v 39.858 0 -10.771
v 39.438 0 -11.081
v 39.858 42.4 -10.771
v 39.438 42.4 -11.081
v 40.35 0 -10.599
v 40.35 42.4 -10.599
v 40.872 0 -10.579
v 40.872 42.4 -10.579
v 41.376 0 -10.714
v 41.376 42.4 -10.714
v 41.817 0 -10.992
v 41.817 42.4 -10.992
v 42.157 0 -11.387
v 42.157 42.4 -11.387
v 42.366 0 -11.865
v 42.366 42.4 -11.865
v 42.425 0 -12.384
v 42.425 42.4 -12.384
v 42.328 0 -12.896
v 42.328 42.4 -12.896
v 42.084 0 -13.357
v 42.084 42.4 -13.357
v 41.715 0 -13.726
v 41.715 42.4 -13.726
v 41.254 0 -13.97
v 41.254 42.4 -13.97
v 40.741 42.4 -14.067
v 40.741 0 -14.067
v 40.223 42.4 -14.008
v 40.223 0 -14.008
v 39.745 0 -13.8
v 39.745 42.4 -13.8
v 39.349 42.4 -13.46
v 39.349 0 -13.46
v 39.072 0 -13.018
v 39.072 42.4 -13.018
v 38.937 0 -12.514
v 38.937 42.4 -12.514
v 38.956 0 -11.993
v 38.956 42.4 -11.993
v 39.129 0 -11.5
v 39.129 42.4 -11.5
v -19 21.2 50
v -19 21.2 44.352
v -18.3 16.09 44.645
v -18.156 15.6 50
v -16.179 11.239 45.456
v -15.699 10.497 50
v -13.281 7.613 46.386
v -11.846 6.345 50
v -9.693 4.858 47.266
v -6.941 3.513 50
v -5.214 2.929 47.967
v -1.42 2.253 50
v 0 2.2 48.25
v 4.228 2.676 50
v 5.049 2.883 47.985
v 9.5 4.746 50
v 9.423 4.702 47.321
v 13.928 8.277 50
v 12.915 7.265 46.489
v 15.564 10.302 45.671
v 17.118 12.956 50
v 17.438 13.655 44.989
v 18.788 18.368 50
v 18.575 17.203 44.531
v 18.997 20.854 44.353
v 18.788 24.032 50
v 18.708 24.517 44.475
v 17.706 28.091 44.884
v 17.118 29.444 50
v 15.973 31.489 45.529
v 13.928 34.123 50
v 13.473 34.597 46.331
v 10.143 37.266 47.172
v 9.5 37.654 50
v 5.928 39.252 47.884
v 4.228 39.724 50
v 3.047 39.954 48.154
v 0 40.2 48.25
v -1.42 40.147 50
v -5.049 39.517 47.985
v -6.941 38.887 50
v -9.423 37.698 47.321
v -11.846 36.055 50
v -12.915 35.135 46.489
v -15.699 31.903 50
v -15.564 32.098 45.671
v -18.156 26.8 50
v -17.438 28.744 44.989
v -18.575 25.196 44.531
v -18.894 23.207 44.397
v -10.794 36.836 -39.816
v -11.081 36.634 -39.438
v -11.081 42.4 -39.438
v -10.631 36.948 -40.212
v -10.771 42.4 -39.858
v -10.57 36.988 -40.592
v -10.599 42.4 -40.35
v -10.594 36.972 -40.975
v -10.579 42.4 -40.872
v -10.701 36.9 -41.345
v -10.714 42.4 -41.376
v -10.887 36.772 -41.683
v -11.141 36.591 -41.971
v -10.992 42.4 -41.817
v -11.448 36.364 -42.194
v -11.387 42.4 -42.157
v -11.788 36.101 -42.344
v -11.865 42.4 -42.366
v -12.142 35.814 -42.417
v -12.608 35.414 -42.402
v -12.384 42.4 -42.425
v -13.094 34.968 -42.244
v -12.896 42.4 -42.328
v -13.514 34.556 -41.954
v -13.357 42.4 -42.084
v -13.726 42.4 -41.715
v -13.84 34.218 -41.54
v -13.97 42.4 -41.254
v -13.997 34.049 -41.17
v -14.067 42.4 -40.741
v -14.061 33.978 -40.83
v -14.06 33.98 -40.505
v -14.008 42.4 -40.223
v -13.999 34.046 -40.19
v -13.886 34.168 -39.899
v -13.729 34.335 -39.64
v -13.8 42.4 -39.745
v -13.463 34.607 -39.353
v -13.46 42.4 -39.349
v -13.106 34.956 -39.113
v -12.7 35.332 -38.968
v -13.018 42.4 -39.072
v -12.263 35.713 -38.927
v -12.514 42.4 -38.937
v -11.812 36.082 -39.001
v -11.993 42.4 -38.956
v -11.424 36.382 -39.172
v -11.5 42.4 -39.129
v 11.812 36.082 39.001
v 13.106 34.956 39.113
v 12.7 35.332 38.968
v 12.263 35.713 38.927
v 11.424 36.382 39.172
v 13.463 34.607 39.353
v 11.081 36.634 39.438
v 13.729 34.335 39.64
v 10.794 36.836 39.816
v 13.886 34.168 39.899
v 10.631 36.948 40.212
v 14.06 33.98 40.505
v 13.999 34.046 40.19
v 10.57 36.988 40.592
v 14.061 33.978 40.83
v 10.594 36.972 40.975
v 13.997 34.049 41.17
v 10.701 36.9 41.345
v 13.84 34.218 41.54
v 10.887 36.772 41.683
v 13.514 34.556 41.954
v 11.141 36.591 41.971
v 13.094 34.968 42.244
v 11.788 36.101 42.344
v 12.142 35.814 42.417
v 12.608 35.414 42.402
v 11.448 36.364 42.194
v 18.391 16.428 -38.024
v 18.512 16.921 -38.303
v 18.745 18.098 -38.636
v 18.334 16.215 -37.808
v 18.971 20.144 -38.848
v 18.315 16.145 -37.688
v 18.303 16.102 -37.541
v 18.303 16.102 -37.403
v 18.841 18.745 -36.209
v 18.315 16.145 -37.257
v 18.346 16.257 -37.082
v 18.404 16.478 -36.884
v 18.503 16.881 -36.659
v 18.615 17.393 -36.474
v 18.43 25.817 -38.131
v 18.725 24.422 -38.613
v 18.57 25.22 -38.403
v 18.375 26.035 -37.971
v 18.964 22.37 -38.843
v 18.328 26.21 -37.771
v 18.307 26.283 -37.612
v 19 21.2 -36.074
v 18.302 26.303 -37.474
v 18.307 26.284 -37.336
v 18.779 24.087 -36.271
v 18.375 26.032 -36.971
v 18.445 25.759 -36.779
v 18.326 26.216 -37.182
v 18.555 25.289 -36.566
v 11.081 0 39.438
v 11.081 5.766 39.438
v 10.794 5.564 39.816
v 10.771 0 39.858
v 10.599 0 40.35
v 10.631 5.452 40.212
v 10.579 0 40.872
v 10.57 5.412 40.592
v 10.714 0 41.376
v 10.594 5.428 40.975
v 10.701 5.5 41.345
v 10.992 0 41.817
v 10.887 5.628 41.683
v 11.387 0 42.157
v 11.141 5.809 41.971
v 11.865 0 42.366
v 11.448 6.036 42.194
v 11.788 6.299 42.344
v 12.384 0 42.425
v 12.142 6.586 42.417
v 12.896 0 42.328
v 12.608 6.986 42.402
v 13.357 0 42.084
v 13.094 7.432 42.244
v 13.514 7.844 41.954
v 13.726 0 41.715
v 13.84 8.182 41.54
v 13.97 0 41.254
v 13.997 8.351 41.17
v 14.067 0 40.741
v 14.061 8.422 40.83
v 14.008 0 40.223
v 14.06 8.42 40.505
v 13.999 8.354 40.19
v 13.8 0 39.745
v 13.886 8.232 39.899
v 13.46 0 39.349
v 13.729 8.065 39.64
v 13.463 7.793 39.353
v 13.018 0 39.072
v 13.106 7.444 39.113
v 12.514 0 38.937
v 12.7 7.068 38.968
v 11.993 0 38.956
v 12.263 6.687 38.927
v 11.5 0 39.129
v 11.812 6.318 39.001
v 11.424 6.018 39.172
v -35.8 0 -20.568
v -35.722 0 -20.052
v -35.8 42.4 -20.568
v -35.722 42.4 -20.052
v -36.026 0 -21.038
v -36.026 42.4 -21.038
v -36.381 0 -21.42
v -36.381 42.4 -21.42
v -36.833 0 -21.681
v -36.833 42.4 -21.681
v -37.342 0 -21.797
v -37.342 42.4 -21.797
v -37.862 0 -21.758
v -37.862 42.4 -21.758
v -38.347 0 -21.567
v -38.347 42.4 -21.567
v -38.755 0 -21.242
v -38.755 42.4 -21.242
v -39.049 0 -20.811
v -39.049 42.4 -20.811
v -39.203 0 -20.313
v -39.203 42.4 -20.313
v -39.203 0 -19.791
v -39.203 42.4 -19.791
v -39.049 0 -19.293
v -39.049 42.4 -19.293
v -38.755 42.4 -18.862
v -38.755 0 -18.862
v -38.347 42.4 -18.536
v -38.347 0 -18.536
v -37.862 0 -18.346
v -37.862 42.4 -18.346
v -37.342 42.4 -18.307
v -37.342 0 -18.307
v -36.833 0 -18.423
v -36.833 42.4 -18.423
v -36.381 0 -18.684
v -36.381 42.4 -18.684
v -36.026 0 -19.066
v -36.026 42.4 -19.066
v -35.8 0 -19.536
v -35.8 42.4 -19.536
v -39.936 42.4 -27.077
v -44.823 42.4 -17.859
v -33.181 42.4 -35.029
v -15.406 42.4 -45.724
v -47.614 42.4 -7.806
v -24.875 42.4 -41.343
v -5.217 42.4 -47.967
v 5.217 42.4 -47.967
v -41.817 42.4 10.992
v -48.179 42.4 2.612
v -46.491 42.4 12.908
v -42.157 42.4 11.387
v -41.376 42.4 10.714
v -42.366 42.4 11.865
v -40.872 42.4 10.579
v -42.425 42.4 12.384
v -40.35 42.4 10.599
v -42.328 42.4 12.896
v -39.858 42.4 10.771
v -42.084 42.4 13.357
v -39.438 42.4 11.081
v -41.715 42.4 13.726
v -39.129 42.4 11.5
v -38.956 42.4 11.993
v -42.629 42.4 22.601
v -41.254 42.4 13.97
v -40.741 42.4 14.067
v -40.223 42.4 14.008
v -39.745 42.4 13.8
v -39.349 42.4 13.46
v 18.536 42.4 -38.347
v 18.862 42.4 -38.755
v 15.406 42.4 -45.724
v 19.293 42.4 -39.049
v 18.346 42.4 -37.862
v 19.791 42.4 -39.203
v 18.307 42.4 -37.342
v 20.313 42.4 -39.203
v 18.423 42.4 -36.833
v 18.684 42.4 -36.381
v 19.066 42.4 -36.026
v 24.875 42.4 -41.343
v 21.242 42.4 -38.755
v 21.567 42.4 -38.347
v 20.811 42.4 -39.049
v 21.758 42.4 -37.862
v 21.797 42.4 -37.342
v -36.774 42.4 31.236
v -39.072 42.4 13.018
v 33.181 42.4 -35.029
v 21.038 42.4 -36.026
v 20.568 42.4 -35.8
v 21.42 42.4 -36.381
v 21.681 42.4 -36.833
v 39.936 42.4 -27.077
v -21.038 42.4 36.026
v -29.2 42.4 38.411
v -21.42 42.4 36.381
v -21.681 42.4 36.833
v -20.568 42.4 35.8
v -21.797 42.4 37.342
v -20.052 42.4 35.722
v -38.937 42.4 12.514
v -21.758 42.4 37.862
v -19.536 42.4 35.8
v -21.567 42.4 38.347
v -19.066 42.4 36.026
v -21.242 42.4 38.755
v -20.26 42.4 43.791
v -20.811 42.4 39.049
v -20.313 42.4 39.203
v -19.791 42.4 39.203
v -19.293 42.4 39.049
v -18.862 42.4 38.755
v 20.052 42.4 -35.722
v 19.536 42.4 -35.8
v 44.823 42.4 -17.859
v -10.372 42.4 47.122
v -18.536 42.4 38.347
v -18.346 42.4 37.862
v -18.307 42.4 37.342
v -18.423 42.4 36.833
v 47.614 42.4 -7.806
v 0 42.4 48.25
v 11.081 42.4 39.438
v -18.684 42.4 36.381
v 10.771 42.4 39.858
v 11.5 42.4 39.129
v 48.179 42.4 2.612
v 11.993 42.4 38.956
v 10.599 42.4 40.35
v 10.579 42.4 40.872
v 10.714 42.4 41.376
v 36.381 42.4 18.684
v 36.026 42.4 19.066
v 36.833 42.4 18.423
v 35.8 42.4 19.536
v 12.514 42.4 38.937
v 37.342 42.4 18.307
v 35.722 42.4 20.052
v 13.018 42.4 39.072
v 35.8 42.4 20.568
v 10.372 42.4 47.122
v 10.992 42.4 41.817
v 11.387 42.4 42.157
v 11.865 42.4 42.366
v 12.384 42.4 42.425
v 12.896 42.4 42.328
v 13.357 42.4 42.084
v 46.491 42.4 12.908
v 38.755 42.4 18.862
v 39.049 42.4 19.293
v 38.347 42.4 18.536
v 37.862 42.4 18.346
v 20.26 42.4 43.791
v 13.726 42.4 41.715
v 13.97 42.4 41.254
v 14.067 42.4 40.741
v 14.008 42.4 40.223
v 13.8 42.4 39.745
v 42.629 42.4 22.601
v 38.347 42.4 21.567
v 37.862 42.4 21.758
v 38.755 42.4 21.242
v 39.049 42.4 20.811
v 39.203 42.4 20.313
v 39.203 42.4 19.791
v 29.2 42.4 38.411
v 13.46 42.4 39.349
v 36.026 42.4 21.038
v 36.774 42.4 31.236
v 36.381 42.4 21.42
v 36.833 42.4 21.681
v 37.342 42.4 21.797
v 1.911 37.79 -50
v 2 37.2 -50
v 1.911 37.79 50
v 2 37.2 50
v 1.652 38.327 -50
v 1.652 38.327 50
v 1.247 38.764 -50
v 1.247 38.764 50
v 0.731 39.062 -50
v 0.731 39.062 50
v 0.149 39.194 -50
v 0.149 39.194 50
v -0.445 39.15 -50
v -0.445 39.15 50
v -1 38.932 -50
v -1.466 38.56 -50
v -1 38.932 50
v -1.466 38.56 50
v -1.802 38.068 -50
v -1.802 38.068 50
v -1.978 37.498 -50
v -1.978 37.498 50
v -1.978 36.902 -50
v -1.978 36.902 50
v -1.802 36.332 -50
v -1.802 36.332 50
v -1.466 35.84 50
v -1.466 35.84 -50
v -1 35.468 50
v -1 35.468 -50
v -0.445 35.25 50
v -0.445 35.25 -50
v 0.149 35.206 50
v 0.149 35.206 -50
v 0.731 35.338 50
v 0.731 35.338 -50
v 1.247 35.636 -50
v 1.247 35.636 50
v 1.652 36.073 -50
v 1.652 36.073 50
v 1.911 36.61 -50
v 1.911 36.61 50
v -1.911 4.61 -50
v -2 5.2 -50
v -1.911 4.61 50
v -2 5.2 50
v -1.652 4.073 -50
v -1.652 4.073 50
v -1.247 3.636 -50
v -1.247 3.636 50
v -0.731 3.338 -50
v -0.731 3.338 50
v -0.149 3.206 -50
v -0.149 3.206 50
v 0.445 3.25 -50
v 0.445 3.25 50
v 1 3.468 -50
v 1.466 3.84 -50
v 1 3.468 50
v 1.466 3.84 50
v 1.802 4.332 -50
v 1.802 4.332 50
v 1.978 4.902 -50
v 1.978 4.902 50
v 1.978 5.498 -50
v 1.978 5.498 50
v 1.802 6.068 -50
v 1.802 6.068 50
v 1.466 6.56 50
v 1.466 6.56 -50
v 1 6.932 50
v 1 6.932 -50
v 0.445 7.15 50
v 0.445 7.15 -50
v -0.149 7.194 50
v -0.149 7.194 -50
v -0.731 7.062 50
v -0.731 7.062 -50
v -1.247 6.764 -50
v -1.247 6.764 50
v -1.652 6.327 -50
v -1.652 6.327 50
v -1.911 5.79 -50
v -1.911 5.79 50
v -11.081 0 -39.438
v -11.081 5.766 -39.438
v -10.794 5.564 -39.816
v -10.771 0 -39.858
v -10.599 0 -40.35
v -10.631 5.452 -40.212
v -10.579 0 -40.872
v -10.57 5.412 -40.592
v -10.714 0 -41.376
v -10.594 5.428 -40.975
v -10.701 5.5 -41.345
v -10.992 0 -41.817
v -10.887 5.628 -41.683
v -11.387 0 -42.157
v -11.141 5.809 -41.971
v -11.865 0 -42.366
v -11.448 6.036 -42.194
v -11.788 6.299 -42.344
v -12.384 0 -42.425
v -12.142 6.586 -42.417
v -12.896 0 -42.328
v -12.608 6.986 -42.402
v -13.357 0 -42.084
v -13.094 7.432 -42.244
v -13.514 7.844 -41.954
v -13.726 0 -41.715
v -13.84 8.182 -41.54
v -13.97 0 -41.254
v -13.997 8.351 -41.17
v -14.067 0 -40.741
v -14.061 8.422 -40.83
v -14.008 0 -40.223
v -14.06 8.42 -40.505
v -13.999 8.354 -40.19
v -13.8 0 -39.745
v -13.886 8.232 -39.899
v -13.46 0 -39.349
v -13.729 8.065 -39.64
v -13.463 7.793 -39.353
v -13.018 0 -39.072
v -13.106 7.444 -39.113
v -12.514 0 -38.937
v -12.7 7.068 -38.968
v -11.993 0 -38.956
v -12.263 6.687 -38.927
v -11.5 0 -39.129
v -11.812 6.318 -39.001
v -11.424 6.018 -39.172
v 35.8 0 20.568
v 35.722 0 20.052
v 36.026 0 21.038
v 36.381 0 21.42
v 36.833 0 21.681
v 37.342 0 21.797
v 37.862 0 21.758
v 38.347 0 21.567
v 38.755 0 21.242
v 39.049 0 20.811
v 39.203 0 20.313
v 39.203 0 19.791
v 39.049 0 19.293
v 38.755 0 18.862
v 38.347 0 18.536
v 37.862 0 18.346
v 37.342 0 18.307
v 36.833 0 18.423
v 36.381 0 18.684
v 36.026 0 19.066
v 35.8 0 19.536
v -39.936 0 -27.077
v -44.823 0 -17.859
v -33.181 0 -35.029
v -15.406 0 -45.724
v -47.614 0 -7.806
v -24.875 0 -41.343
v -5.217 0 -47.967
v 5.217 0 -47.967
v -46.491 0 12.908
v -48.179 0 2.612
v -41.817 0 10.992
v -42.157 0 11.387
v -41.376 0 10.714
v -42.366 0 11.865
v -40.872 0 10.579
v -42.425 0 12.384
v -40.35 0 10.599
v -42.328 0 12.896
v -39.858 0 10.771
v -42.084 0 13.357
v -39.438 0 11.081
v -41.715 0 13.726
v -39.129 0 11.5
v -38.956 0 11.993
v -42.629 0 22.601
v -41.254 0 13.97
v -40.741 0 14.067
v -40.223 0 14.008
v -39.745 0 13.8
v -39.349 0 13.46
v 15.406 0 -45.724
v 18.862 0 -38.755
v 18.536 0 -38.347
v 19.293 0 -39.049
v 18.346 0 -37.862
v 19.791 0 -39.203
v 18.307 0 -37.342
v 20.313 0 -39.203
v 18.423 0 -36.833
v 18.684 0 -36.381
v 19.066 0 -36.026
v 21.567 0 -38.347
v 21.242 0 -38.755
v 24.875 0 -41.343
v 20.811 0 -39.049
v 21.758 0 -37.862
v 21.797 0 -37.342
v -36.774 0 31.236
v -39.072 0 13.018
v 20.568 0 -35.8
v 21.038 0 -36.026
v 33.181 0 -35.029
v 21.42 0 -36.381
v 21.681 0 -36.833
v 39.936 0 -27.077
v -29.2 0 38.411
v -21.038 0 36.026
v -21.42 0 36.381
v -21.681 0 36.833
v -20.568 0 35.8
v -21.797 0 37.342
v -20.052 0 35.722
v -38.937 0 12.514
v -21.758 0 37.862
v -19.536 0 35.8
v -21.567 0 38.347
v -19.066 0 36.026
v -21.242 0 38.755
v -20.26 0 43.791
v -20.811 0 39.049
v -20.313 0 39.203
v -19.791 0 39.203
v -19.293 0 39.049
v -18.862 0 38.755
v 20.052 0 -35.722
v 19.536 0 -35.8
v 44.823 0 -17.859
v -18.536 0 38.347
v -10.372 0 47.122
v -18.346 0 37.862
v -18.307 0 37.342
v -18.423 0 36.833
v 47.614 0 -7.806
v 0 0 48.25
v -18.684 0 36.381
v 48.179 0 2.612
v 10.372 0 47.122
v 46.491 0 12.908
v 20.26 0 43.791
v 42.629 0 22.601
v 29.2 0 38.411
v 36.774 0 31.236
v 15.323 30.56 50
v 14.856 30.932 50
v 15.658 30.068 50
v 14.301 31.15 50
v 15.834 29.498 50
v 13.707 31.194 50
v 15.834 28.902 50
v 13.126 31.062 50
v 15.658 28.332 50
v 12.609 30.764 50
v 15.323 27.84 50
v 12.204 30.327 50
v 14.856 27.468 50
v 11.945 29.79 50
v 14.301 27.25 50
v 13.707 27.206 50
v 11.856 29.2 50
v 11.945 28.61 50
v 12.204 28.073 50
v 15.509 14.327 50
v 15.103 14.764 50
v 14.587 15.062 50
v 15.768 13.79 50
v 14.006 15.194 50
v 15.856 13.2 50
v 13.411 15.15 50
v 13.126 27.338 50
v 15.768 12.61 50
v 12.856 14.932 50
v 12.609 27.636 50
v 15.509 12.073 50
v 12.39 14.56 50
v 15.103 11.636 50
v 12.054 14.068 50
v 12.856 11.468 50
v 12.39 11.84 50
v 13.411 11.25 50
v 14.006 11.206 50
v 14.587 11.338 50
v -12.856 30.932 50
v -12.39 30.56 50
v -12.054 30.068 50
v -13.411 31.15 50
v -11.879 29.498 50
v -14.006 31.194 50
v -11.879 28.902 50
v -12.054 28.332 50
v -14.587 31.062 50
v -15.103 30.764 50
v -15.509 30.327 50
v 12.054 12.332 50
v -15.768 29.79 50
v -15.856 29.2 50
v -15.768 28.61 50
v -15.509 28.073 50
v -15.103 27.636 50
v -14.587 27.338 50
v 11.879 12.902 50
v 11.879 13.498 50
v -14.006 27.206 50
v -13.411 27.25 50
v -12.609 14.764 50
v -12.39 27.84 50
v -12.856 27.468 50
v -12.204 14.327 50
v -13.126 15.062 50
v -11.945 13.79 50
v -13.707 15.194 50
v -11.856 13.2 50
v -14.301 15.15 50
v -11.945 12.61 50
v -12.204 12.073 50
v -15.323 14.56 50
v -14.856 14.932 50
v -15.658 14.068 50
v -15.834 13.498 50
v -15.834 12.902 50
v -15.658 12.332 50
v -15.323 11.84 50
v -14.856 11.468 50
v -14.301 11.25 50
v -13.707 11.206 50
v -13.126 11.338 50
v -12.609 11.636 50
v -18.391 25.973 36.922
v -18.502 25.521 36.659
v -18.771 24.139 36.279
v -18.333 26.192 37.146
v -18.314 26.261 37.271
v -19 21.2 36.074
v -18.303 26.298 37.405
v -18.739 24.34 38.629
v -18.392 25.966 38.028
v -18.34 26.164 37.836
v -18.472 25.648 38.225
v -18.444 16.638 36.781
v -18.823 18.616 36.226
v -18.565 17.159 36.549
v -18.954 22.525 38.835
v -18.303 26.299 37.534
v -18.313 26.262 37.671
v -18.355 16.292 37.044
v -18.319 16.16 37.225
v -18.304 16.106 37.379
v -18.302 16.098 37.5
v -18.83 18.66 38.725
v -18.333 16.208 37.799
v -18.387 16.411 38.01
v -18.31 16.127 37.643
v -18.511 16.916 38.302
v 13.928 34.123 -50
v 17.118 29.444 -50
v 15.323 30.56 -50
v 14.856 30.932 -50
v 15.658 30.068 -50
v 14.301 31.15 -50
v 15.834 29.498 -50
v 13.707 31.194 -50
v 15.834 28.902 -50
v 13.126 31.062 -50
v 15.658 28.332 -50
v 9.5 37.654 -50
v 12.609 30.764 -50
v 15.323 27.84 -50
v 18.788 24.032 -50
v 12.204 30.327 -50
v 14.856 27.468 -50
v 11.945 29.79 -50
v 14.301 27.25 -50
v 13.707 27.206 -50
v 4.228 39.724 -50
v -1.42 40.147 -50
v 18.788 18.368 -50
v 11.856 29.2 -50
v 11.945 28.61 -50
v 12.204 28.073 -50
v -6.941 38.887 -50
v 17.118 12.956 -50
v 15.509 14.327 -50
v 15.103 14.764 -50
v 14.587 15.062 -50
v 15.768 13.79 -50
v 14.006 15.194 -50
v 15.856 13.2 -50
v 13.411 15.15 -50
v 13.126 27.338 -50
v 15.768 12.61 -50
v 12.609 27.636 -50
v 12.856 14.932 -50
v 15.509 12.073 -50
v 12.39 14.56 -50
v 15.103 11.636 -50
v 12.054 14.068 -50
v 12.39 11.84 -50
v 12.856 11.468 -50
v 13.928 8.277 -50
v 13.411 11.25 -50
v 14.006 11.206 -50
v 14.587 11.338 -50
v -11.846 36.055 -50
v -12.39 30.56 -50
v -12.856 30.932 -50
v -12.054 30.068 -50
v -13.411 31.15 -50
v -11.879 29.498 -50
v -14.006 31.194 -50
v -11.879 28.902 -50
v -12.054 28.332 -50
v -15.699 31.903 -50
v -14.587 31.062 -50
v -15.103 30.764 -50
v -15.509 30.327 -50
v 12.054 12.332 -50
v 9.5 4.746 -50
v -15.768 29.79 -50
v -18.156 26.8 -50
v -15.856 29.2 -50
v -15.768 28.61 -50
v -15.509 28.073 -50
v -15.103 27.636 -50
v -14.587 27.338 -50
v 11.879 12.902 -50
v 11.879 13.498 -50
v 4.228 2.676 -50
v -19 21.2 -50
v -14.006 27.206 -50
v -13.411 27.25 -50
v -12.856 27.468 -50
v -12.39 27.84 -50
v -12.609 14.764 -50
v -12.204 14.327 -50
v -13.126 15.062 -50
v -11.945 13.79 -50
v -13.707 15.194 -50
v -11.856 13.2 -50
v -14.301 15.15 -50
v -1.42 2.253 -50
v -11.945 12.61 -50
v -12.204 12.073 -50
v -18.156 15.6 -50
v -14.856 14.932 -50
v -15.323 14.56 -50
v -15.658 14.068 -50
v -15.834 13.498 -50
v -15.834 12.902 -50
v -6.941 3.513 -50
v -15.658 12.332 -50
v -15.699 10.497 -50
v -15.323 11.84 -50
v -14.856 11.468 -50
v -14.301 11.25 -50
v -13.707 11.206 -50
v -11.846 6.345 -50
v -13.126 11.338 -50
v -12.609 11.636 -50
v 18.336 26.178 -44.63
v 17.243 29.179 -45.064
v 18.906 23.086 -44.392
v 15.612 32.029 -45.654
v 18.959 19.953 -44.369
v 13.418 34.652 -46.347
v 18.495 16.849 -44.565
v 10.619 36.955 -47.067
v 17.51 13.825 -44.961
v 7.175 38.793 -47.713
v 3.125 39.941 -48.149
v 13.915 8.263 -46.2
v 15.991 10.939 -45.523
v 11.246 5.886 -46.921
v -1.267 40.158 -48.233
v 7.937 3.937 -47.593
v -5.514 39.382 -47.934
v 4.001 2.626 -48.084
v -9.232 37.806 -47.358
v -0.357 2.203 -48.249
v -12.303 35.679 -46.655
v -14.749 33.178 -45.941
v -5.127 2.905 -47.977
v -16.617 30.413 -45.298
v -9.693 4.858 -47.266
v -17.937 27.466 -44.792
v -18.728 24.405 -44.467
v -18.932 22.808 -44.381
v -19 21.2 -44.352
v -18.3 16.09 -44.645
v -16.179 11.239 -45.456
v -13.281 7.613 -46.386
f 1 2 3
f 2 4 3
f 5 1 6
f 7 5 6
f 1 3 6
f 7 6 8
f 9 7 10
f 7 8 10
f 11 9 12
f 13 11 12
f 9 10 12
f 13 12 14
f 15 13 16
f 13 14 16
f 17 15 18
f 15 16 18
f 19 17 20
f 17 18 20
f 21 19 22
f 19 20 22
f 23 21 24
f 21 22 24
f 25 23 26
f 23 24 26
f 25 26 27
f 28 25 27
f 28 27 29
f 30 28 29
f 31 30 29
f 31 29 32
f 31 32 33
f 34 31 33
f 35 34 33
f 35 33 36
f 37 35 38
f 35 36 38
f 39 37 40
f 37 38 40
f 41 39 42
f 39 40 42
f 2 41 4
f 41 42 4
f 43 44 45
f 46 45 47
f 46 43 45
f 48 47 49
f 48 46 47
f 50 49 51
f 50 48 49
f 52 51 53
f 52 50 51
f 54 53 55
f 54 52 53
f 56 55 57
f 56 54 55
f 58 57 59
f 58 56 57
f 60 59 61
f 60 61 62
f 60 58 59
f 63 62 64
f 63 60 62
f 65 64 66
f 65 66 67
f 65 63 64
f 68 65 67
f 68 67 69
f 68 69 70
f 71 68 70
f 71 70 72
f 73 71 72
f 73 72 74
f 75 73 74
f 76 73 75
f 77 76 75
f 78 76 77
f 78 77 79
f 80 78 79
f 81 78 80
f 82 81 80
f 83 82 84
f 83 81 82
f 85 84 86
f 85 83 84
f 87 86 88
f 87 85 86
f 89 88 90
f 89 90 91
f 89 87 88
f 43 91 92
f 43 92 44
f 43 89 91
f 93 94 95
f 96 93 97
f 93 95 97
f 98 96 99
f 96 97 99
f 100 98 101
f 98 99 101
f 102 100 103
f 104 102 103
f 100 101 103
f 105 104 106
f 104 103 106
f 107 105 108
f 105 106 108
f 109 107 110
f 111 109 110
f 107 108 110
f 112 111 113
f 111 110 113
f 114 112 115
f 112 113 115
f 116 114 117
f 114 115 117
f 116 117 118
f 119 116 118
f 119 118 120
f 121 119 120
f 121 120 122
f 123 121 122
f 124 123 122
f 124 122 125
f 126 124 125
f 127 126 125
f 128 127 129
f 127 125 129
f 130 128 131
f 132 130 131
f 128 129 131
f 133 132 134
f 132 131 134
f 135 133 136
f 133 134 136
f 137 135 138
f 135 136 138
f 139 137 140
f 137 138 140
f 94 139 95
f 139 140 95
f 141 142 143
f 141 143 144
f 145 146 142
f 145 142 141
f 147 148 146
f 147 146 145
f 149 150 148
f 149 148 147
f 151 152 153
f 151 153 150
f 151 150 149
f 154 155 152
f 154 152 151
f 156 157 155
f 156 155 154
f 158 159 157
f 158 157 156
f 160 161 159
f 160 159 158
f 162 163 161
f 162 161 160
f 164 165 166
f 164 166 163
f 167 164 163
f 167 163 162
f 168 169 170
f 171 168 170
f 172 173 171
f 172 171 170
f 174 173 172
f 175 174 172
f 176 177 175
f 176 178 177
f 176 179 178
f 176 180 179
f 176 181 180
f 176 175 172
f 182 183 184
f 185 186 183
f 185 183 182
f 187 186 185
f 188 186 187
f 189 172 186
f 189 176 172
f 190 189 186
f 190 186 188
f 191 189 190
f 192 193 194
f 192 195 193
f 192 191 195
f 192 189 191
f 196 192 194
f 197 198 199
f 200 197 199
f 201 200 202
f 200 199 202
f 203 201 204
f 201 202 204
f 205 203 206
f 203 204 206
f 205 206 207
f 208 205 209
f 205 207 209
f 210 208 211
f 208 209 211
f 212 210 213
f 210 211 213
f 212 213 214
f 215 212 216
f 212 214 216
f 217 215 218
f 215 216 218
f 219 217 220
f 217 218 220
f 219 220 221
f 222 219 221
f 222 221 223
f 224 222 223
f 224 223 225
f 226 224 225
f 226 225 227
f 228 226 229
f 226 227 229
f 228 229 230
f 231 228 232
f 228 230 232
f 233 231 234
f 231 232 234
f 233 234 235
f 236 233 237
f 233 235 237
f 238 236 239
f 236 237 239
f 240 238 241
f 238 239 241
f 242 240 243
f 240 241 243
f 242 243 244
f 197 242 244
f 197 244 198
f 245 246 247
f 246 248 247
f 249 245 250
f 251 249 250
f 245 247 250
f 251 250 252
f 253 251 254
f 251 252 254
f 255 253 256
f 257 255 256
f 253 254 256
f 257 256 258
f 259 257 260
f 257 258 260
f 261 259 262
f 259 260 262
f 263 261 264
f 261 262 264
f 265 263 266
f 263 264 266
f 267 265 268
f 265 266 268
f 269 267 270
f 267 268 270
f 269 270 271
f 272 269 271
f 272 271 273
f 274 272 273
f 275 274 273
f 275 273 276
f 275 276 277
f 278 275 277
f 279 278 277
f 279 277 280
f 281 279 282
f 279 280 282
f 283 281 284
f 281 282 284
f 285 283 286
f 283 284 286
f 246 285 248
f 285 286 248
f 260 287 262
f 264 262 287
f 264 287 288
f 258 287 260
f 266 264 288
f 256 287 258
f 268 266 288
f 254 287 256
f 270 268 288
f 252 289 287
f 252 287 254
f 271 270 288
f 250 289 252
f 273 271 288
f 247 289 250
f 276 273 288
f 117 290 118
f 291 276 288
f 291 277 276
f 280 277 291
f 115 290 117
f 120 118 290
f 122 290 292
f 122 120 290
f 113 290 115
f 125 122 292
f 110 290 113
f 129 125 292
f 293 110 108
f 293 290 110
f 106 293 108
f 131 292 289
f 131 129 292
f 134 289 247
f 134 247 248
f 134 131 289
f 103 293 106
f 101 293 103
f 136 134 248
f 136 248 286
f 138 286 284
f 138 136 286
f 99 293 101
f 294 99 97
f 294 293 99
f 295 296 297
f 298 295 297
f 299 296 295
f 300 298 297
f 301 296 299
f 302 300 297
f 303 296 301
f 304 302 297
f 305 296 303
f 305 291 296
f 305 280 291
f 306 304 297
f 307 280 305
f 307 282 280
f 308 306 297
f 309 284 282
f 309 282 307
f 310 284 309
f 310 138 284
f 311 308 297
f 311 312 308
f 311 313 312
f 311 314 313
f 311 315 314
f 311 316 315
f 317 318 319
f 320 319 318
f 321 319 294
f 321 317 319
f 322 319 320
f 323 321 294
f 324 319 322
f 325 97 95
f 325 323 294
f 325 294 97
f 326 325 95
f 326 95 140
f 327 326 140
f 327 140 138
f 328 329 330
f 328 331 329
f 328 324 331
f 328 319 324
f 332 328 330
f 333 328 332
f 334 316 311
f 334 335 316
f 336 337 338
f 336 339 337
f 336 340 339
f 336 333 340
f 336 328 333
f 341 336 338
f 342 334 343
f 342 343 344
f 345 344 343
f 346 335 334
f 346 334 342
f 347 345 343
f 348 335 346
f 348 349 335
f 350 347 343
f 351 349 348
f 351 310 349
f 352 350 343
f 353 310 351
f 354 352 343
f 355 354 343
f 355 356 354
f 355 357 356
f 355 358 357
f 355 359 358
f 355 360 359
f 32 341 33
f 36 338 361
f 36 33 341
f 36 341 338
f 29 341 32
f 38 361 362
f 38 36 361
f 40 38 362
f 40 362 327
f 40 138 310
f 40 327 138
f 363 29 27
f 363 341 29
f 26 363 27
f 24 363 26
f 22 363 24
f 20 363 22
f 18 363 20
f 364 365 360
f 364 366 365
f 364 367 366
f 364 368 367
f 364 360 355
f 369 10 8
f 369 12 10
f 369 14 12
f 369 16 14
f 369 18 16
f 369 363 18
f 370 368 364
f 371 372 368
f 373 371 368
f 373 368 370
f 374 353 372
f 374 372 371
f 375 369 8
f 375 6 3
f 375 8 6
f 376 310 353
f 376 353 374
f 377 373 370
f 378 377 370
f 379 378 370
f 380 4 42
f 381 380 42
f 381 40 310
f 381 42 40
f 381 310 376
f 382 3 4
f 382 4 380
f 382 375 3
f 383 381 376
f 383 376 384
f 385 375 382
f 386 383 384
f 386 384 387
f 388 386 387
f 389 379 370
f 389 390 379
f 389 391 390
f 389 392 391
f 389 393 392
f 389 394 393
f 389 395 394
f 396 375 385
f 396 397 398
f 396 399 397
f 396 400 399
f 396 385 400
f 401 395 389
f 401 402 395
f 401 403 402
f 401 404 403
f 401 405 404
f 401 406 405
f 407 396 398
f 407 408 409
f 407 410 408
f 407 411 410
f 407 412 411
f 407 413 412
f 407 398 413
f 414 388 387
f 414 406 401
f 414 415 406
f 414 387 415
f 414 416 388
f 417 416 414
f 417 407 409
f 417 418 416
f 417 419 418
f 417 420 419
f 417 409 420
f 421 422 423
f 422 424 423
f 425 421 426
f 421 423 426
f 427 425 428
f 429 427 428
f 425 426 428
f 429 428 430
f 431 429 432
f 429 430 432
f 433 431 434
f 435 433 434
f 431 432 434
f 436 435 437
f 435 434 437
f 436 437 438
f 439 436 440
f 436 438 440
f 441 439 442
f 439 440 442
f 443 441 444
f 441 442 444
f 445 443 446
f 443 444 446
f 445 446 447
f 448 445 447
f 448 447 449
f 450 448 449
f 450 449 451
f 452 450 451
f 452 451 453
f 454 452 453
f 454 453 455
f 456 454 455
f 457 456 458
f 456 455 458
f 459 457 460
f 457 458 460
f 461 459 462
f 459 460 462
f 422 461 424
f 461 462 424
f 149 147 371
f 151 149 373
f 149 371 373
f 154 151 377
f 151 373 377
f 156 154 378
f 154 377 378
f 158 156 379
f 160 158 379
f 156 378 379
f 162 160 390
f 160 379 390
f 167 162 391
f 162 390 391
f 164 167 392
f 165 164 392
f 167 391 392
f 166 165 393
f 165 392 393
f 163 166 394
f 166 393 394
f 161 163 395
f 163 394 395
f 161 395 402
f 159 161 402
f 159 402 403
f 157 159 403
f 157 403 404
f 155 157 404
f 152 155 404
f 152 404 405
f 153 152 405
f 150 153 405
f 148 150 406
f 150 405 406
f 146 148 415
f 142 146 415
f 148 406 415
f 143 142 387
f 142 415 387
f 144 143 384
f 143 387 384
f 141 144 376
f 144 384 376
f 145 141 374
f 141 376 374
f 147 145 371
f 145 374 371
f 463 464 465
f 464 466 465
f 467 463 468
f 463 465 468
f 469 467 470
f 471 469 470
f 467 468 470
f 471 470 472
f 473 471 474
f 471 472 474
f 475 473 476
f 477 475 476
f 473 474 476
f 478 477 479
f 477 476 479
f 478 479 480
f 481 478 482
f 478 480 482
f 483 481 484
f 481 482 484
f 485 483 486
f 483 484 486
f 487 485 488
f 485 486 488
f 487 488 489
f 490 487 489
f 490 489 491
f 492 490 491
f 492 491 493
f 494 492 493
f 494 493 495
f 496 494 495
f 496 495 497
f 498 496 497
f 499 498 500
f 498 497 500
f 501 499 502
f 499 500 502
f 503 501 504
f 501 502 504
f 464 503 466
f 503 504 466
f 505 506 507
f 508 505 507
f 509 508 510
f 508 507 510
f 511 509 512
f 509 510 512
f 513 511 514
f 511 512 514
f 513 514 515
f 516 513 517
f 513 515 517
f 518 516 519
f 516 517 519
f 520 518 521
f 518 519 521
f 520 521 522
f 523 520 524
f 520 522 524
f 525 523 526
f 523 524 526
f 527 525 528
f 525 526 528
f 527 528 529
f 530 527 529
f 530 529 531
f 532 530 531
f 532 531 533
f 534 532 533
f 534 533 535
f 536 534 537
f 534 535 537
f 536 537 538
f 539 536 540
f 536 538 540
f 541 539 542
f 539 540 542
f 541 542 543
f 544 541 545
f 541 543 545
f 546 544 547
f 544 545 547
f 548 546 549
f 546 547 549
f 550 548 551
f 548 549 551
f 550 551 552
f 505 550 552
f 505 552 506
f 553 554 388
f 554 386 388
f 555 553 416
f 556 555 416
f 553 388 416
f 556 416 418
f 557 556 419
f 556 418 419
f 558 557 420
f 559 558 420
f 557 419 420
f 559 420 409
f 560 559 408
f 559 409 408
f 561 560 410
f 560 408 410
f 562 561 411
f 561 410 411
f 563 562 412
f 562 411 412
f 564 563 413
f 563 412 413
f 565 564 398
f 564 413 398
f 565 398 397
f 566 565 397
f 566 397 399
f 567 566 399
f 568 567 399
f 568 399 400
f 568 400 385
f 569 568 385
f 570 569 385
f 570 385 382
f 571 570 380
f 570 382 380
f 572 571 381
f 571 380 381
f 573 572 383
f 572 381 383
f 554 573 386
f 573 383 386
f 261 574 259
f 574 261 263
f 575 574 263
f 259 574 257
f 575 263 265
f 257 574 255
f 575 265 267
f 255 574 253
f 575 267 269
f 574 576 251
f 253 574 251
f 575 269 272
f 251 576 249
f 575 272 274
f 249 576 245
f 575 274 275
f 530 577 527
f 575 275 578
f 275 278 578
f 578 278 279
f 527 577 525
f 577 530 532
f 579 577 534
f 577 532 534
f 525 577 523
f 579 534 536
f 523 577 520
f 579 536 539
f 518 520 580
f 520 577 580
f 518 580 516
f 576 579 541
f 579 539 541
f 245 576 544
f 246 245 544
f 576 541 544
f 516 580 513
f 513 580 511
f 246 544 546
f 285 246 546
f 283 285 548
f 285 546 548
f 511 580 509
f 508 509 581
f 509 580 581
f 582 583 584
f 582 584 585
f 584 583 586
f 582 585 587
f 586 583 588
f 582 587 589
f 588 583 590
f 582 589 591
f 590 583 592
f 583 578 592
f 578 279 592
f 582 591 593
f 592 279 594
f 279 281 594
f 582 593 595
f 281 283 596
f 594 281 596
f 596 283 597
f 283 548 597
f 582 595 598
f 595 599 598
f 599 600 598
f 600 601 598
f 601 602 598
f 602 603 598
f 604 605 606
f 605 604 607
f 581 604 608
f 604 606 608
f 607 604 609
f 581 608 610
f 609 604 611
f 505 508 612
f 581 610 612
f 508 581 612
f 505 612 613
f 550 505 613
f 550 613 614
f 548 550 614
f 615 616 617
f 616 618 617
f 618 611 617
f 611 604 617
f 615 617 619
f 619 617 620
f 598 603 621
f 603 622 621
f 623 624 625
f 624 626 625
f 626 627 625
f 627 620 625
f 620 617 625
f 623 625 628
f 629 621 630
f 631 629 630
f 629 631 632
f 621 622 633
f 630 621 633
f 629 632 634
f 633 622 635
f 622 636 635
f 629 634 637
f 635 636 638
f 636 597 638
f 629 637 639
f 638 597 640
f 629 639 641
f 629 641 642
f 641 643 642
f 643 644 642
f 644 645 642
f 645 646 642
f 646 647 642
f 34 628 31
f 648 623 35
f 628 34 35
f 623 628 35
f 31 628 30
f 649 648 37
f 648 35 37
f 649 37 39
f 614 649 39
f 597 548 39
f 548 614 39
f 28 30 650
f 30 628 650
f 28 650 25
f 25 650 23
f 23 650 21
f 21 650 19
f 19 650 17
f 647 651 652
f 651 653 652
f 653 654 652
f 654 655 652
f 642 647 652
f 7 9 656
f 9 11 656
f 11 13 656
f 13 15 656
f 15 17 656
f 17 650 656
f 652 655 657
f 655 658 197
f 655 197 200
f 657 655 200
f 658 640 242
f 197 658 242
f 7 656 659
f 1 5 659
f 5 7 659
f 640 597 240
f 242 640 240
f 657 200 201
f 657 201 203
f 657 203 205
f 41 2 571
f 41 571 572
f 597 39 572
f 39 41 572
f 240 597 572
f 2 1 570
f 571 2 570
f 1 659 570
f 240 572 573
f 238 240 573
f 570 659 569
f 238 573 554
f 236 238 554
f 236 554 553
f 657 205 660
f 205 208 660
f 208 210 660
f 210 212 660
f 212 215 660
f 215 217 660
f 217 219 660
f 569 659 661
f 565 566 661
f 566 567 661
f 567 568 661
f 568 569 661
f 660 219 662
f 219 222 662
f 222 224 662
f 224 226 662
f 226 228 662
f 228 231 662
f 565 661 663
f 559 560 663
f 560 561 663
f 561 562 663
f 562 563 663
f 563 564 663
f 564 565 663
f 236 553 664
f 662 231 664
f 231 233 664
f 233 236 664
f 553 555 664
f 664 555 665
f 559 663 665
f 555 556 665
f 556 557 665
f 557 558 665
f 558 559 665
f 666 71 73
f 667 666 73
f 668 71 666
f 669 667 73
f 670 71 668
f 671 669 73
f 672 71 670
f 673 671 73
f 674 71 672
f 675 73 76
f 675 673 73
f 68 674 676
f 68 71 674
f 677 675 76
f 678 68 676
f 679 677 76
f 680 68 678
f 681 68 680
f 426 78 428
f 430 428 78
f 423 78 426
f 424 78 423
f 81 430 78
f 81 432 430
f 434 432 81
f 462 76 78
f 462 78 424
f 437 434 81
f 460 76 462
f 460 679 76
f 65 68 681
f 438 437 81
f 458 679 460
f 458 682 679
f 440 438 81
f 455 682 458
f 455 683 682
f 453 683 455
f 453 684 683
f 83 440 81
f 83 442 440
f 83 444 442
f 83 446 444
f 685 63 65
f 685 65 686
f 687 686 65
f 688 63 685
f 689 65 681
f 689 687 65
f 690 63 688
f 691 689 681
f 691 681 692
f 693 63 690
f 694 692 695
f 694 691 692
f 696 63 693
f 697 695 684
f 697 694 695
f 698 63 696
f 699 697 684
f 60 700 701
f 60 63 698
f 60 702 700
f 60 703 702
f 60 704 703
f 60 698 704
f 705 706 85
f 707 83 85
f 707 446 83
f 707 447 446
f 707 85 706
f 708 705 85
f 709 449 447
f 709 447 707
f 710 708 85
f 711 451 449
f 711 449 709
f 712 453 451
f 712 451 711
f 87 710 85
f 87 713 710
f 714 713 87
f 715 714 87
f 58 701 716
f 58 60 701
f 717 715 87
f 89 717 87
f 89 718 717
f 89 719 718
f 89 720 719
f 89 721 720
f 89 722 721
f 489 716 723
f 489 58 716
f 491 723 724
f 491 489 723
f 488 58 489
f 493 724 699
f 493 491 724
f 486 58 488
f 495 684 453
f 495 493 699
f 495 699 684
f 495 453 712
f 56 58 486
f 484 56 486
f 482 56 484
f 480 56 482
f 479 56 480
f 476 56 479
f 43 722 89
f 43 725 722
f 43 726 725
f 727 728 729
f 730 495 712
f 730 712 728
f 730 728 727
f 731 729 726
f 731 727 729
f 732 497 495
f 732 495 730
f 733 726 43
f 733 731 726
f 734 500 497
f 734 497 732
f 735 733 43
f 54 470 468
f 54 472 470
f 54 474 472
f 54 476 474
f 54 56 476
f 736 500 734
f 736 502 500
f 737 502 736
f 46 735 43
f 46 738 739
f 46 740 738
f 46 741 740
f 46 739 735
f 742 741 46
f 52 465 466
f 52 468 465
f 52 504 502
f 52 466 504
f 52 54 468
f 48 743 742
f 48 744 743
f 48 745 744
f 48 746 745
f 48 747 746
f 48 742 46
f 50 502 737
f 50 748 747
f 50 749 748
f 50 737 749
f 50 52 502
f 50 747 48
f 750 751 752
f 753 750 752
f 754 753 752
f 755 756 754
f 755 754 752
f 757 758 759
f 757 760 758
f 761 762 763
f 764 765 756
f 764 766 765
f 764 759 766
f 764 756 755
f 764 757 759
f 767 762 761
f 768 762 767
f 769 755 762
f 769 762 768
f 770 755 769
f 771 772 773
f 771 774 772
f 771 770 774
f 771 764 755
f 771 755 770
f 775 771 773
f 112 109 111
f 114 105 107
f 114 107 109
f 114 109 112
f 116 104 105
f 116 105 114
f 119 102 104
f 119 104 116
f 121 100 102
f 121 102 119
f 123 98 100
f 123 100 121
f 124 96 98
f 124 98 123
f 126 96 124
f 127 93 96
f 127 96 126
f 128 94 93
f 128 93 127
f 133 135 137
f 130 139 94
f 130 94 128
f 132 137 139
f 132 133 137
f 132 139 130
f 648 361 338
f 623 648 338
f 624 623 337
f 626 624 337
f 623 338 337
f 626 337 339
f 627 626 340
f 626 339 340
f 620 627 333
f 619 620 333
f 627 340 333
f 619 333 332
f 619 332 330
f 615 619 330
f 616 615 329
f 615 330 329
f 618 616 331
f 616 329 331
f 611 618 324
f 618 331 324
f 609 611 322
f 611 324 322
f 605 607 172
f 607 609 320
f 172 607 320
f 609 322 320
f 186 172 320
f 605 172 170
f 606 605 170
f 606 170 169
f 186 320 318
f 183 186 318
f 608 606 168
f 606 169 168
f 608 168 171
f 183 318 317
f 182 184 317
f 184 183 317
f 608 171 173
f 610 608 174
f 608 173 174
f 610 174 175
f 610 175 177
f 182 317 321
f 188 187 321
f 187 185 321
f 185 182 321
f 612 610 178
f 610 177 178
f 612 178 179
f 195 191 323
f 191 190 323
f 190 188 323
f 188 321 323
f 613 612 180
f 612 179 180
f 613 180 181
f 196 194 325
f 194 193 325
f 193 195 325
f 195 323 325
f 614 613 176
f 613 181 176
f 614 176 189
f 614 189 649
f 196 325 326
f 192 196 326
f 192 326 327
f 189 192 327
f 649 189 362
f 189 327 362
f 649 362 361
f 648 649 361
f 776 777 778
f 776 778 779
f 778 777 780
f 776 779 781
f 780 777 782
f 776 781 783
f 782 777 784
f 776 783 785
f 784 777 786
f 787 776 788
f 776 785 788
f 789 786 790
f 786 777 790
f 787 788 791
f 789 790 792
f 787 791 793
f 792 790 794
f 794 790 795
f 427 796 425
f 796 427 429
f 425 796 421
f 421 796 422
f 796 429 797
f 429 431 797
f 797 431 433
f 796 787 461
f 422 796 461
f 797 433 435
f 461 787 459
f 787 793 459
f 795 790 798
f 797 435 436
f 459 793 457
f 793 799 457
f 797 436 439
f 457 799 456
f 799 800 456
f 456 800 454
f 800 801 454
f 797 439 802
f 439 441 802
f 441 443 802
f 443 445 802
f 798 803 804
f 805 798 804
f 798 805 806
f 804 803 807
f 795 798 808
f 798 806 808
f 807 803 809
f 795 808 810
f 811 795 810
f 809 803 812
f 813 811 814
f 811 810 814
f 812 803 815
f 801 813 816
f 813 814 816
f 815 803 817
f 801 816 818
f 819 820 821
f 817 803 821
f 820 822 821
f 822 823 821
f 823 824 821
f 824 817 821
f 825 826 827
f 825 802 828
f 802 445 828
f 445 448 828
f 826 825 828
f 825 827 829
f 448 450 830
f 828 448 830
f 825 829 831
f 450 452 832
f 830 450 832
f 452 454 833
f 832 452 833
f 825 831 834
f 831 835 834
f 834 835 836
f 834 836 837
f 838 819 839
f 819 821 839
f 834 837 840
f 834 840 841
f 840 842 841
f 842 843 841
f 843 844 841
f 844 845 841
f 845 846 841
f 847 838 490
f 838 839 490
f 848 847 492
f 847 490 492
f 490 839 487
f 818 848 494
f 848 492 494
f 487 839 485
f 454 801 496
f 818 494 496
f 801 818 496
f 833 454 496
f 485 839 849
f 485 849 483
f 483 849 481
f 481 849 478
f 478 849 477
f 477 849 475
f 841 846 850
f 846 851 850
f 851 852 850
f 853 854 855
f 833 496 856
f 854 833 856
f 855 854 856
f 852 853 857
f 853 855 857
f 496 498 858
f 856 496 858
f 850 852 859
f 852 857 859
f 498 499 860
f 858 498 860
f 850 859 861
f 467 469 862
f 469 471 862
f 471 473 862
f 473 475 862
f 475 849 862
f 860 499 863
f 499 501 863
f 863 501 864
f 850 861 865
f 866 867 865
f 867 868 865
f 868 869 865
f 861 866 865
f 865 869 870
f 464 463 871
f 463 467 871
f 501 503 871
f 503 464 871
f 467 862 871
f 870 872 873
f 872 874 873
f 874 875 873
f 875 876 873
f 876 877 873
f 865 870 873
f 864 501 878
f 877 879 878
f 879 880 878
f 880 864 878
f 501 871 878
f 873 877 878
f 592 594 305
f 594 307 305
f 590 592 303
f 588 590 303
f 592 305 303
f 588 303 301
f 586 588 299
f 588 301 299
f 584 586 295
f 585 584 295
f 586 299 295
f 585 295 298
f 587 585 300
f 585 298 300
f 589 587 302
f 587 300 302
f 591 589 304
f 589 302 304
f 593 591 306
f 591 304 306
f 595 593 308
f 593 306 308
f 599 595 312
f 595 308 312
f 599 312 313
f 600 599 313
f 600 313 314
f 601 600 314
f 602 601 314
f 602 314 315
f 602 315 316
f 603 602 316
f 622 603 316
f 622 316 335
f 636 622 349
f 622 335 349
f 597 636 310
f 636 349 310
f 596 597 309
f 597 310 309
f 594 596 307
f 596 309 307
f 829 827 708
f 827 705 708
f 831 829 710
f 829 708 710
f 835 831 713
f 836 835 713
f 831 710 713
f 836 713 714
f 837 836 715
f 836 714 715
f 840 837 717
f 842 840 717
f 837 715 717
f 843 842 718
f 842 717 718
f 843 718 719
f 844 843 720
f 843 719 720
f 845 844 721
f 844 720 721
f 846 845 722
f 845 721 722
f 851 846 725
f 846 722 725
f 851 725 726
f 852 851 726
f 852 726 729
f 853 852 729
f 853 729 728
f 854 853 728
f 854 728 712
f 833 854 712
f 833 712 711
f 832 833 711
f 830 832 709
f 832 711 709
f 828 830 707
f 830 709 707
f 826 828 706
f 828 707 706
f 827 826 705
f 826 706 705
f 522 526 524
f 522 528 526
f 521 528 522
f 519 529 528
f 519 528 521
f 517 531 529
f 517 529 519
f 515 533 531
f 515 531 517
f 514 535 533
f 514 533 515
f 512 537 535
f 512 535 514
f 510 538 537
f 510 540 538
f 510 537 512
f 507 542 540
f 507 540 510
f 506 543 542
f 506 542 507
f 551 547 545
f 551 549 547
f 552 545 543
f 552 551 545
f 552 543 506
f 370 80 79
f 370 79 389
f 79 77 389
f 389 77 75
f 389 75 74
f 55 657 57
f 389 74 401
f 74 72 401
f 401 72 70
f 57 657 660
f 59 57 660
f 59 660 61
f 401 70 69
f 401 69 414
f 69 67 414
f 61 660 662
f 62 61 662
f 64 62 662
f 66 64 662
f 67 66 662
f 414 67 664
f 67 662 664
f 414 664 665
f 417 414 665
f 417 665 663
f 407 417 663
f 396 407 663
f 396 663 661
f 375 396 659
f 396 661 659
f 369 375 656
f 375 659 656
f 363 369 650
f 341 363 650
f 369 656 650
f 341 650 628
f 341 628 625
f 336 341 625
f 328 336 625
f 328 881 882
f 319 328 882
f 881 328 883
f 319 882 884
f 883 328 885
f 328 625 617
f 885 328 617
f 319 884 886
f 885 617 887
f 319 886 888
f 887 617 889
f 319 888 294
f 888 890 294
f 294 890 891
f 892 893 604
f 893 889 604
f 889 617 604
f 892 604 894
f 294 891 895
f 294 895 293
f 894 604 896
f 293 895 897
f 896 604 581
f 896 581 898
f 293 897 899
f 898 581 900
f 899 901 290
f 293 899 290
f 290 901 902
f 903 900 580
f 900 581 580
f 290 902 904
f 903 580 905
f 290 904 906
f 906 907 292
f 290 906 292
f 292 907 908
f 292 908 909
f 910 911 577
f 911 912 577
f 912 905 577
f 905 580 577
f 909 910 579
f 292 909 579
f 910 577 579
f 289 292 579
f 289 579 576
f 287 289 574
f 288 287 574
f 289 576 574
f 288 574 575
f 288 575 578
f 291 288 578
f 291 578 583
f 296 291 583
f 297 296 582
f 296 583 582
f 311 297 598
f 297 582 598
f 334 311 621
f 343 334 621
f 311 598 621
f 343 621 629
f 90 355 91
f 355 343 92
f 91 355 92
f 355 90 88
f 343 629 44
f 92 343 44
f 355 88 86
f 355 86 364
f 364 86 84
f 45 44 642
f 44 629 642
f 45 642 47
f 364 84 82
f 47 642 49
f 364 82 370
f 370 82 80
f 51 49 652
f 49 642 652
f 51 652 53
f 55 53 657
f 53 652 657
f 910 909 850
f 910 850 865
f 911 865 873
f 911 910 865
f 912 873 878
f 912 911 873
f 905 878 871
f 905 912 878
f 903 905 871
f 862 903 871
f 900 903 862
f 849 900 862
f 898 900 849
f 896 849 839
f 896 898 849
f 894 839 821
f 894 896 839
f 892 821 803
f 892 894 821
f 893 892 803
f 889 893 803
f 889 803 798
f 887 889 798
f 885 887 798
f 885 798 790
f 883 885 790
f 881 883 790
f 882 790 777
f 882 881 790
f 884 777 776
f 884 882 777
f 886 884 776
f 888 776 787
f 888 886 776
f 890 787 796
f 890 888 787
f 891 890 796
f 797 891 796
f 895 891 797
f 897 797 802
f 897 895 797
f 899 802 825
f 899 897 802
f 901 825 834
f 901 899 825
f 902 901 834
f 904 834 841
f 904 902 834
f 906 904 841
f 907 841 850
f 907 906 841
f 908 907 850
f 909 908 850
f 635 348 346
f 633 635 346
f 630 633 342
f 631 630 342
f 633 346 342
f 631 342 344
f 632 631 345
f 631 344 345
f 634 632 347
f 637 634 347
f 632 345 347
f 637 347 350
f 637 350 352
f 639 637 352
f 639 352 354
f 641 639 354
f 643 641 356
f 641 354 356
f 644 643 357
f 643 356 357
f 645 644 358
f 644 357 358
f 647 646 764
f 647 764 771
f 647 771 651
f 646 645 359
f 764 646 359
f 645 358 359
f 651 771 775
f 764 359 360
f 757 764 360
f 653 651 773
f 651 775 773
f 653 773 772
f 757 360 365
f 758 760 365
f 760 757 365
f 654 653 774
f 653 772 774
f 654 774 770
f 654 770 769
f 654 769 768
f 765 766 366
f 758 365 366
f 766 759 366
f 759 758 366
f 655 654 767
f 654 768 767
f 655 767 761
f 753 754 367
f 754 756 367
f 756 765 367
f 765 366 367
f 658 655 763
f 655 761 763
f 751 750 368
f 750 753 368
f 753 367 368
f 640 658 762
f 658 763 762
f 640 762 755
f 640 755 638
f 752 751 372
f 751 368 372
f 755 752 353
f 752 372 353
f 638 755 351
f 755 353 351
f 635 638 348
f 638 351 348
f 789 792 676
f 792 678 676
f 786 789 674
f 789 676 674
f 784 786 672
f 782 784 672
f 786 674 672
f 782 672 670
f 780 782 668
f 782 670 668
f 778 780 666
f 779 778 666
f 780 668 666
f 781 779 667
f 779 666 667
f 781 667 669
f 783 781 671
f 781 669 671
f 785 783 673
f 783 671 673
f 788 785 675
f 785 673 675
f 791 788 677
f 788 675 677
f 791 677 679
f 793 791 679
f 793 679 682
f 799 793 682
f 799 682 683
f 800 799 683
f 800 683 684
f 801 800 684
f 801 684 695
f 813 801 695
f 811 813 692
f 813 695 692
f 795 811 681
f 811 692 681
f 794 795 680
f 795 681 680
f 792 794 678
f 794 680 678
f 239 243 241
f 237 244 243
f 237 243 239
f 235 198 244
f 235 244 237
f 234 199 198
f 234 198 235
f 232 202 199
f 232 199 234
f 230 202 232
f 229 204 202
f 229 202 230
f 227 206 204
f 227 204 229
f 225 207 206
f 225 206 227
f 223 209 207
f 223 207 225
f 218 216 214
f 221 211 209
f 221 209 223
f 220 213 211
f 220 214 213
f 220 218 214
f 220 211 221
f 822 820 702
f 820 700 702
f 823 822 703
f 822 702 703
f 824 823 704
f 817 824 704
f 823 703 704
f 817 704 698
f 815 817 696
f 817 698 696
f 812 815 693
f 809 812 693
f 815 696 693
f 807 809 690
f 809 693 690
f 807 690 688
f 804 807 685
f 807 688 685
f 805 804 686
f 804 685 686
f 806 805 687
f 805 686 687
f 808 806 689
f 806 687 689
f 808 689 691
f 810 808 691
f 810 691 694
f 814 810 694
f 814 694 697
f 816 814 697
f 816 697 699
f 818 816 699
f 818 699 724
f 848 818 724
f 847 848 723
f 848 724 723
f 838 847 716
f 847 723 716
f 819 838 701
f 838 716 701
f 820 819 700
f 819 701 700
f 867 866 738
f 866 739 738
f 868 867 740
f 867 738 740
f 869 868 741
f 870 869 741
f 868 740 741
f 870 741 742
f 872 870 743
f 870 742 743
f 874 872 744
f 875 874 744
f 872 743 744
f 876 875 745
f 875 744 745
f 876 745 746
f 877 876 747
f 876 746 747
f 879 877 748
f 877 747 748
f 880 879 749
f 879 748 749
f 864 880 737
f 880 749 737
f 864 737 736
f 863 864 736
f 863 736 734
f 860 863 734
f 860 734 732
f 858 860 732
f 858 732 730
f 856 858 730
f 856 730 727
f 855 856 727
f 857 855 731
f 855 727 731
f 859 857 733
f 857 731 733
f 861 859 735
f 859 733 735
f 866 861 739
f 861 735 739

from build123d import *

# Parameters (mm, degrees)
SKETCH_1_R               = 48.25
EXTRUDE_2_DEPTH          = 42.4
SKETCH_2_R               = 1.75
CUT_EXTRUDE_1_DEPTH      = 81.336075334
PATTERN_CIRCULAR_2_COUNT = 8
SKETCH_4_R               = 19
EXTRUDE_4_DEPTH          = 50
SKETCH_5_R               = 2
CUT_EXTRUDE_2_DEPTH      = 119.852103634
PATTERN_CIRCULAR_3_COUNT = 6


with BuildPart() as part:
    # 草图1 → 凸台-拉伸2 (new body)
    with BuildSketch(Plane(origin=(0, 0, 0), x_dir=(1, 0, 0), z_dir=(0, 1, 0))):
        with Locations(Location((0, 0, 0), (0, 0, 270))):
            Circle(SKETCH_1_R)
    extrude(amount=EXTRUDE_2_DEPTH)

    # 草图2 → 切除-拉伸1 (cut, symmetric)
    with BuildSketch(Plane(origin=(0, 42.4, 0), x_dir=(1, 0, 0), z_dir=(0, 1, 0))):
        with Locations(Location((20.051879178, 37.472284978, 0), (0, 0, 270))):
            Circle(SKETCH_2_R)
    cut_extrude_1 = extrude(amount=CUT_EXTRUDE_1_DEPTH, both=True, mode=Mode.SUBTRACT)

    # 阵列(圆周)2: 切除-拉伸1 ×8 about axis
    pattern_circular_2_axis = Axis((0, 0, 0), (0, 1, 0))
    for i in range(1, PATTERN_CIRCULAR_2_COUNT):
        add(cut_extrude_1.rotate(pattern_circular_2_axis, i * 360 / PATTERN_CIRCULAR_2_COUNT), mode=Mode.SUBTRACT)

    # 草图4 → 凸台-拉伸4 (add, symmetric)
    with BuildSketch(Plane.XY):
        with Locations(Location((0, 21.2, 0), (0, 0, 180))):
            Circle(SKETCH_4_R)
    extrude(amount=EXTRUDE_4_DEPTH, both=True)

    # 草图5 → 切除-拉伸2 (cut, symmetric)
    with BuildSketch(Plane.XY.offset(50)):
        with Locations((0, 37.2)):
            Circle(SKETCH_5_R)
    cut_extrude_2 = extrude(amount=CUT_EXTRUDE_2_DEPTH, both=True, mode=Mode.SUBTRACT)

    # 阵列(圆周)3: 切除-拉伸2 ×6 about axis
    pattern_circular_3_axis = Axis((0, 21.2, 0), (0, 0, 1))
    for i in range(1, PATTERN_CIRCULAR_3_COUNT):
        add(cut_extrude_2.rotate(pattern_circular_3_axis, i * 360 / PATTERN_CIRCULAR_3_COUNT), mode=Mode.SUBTRACT)


solid = part.part
